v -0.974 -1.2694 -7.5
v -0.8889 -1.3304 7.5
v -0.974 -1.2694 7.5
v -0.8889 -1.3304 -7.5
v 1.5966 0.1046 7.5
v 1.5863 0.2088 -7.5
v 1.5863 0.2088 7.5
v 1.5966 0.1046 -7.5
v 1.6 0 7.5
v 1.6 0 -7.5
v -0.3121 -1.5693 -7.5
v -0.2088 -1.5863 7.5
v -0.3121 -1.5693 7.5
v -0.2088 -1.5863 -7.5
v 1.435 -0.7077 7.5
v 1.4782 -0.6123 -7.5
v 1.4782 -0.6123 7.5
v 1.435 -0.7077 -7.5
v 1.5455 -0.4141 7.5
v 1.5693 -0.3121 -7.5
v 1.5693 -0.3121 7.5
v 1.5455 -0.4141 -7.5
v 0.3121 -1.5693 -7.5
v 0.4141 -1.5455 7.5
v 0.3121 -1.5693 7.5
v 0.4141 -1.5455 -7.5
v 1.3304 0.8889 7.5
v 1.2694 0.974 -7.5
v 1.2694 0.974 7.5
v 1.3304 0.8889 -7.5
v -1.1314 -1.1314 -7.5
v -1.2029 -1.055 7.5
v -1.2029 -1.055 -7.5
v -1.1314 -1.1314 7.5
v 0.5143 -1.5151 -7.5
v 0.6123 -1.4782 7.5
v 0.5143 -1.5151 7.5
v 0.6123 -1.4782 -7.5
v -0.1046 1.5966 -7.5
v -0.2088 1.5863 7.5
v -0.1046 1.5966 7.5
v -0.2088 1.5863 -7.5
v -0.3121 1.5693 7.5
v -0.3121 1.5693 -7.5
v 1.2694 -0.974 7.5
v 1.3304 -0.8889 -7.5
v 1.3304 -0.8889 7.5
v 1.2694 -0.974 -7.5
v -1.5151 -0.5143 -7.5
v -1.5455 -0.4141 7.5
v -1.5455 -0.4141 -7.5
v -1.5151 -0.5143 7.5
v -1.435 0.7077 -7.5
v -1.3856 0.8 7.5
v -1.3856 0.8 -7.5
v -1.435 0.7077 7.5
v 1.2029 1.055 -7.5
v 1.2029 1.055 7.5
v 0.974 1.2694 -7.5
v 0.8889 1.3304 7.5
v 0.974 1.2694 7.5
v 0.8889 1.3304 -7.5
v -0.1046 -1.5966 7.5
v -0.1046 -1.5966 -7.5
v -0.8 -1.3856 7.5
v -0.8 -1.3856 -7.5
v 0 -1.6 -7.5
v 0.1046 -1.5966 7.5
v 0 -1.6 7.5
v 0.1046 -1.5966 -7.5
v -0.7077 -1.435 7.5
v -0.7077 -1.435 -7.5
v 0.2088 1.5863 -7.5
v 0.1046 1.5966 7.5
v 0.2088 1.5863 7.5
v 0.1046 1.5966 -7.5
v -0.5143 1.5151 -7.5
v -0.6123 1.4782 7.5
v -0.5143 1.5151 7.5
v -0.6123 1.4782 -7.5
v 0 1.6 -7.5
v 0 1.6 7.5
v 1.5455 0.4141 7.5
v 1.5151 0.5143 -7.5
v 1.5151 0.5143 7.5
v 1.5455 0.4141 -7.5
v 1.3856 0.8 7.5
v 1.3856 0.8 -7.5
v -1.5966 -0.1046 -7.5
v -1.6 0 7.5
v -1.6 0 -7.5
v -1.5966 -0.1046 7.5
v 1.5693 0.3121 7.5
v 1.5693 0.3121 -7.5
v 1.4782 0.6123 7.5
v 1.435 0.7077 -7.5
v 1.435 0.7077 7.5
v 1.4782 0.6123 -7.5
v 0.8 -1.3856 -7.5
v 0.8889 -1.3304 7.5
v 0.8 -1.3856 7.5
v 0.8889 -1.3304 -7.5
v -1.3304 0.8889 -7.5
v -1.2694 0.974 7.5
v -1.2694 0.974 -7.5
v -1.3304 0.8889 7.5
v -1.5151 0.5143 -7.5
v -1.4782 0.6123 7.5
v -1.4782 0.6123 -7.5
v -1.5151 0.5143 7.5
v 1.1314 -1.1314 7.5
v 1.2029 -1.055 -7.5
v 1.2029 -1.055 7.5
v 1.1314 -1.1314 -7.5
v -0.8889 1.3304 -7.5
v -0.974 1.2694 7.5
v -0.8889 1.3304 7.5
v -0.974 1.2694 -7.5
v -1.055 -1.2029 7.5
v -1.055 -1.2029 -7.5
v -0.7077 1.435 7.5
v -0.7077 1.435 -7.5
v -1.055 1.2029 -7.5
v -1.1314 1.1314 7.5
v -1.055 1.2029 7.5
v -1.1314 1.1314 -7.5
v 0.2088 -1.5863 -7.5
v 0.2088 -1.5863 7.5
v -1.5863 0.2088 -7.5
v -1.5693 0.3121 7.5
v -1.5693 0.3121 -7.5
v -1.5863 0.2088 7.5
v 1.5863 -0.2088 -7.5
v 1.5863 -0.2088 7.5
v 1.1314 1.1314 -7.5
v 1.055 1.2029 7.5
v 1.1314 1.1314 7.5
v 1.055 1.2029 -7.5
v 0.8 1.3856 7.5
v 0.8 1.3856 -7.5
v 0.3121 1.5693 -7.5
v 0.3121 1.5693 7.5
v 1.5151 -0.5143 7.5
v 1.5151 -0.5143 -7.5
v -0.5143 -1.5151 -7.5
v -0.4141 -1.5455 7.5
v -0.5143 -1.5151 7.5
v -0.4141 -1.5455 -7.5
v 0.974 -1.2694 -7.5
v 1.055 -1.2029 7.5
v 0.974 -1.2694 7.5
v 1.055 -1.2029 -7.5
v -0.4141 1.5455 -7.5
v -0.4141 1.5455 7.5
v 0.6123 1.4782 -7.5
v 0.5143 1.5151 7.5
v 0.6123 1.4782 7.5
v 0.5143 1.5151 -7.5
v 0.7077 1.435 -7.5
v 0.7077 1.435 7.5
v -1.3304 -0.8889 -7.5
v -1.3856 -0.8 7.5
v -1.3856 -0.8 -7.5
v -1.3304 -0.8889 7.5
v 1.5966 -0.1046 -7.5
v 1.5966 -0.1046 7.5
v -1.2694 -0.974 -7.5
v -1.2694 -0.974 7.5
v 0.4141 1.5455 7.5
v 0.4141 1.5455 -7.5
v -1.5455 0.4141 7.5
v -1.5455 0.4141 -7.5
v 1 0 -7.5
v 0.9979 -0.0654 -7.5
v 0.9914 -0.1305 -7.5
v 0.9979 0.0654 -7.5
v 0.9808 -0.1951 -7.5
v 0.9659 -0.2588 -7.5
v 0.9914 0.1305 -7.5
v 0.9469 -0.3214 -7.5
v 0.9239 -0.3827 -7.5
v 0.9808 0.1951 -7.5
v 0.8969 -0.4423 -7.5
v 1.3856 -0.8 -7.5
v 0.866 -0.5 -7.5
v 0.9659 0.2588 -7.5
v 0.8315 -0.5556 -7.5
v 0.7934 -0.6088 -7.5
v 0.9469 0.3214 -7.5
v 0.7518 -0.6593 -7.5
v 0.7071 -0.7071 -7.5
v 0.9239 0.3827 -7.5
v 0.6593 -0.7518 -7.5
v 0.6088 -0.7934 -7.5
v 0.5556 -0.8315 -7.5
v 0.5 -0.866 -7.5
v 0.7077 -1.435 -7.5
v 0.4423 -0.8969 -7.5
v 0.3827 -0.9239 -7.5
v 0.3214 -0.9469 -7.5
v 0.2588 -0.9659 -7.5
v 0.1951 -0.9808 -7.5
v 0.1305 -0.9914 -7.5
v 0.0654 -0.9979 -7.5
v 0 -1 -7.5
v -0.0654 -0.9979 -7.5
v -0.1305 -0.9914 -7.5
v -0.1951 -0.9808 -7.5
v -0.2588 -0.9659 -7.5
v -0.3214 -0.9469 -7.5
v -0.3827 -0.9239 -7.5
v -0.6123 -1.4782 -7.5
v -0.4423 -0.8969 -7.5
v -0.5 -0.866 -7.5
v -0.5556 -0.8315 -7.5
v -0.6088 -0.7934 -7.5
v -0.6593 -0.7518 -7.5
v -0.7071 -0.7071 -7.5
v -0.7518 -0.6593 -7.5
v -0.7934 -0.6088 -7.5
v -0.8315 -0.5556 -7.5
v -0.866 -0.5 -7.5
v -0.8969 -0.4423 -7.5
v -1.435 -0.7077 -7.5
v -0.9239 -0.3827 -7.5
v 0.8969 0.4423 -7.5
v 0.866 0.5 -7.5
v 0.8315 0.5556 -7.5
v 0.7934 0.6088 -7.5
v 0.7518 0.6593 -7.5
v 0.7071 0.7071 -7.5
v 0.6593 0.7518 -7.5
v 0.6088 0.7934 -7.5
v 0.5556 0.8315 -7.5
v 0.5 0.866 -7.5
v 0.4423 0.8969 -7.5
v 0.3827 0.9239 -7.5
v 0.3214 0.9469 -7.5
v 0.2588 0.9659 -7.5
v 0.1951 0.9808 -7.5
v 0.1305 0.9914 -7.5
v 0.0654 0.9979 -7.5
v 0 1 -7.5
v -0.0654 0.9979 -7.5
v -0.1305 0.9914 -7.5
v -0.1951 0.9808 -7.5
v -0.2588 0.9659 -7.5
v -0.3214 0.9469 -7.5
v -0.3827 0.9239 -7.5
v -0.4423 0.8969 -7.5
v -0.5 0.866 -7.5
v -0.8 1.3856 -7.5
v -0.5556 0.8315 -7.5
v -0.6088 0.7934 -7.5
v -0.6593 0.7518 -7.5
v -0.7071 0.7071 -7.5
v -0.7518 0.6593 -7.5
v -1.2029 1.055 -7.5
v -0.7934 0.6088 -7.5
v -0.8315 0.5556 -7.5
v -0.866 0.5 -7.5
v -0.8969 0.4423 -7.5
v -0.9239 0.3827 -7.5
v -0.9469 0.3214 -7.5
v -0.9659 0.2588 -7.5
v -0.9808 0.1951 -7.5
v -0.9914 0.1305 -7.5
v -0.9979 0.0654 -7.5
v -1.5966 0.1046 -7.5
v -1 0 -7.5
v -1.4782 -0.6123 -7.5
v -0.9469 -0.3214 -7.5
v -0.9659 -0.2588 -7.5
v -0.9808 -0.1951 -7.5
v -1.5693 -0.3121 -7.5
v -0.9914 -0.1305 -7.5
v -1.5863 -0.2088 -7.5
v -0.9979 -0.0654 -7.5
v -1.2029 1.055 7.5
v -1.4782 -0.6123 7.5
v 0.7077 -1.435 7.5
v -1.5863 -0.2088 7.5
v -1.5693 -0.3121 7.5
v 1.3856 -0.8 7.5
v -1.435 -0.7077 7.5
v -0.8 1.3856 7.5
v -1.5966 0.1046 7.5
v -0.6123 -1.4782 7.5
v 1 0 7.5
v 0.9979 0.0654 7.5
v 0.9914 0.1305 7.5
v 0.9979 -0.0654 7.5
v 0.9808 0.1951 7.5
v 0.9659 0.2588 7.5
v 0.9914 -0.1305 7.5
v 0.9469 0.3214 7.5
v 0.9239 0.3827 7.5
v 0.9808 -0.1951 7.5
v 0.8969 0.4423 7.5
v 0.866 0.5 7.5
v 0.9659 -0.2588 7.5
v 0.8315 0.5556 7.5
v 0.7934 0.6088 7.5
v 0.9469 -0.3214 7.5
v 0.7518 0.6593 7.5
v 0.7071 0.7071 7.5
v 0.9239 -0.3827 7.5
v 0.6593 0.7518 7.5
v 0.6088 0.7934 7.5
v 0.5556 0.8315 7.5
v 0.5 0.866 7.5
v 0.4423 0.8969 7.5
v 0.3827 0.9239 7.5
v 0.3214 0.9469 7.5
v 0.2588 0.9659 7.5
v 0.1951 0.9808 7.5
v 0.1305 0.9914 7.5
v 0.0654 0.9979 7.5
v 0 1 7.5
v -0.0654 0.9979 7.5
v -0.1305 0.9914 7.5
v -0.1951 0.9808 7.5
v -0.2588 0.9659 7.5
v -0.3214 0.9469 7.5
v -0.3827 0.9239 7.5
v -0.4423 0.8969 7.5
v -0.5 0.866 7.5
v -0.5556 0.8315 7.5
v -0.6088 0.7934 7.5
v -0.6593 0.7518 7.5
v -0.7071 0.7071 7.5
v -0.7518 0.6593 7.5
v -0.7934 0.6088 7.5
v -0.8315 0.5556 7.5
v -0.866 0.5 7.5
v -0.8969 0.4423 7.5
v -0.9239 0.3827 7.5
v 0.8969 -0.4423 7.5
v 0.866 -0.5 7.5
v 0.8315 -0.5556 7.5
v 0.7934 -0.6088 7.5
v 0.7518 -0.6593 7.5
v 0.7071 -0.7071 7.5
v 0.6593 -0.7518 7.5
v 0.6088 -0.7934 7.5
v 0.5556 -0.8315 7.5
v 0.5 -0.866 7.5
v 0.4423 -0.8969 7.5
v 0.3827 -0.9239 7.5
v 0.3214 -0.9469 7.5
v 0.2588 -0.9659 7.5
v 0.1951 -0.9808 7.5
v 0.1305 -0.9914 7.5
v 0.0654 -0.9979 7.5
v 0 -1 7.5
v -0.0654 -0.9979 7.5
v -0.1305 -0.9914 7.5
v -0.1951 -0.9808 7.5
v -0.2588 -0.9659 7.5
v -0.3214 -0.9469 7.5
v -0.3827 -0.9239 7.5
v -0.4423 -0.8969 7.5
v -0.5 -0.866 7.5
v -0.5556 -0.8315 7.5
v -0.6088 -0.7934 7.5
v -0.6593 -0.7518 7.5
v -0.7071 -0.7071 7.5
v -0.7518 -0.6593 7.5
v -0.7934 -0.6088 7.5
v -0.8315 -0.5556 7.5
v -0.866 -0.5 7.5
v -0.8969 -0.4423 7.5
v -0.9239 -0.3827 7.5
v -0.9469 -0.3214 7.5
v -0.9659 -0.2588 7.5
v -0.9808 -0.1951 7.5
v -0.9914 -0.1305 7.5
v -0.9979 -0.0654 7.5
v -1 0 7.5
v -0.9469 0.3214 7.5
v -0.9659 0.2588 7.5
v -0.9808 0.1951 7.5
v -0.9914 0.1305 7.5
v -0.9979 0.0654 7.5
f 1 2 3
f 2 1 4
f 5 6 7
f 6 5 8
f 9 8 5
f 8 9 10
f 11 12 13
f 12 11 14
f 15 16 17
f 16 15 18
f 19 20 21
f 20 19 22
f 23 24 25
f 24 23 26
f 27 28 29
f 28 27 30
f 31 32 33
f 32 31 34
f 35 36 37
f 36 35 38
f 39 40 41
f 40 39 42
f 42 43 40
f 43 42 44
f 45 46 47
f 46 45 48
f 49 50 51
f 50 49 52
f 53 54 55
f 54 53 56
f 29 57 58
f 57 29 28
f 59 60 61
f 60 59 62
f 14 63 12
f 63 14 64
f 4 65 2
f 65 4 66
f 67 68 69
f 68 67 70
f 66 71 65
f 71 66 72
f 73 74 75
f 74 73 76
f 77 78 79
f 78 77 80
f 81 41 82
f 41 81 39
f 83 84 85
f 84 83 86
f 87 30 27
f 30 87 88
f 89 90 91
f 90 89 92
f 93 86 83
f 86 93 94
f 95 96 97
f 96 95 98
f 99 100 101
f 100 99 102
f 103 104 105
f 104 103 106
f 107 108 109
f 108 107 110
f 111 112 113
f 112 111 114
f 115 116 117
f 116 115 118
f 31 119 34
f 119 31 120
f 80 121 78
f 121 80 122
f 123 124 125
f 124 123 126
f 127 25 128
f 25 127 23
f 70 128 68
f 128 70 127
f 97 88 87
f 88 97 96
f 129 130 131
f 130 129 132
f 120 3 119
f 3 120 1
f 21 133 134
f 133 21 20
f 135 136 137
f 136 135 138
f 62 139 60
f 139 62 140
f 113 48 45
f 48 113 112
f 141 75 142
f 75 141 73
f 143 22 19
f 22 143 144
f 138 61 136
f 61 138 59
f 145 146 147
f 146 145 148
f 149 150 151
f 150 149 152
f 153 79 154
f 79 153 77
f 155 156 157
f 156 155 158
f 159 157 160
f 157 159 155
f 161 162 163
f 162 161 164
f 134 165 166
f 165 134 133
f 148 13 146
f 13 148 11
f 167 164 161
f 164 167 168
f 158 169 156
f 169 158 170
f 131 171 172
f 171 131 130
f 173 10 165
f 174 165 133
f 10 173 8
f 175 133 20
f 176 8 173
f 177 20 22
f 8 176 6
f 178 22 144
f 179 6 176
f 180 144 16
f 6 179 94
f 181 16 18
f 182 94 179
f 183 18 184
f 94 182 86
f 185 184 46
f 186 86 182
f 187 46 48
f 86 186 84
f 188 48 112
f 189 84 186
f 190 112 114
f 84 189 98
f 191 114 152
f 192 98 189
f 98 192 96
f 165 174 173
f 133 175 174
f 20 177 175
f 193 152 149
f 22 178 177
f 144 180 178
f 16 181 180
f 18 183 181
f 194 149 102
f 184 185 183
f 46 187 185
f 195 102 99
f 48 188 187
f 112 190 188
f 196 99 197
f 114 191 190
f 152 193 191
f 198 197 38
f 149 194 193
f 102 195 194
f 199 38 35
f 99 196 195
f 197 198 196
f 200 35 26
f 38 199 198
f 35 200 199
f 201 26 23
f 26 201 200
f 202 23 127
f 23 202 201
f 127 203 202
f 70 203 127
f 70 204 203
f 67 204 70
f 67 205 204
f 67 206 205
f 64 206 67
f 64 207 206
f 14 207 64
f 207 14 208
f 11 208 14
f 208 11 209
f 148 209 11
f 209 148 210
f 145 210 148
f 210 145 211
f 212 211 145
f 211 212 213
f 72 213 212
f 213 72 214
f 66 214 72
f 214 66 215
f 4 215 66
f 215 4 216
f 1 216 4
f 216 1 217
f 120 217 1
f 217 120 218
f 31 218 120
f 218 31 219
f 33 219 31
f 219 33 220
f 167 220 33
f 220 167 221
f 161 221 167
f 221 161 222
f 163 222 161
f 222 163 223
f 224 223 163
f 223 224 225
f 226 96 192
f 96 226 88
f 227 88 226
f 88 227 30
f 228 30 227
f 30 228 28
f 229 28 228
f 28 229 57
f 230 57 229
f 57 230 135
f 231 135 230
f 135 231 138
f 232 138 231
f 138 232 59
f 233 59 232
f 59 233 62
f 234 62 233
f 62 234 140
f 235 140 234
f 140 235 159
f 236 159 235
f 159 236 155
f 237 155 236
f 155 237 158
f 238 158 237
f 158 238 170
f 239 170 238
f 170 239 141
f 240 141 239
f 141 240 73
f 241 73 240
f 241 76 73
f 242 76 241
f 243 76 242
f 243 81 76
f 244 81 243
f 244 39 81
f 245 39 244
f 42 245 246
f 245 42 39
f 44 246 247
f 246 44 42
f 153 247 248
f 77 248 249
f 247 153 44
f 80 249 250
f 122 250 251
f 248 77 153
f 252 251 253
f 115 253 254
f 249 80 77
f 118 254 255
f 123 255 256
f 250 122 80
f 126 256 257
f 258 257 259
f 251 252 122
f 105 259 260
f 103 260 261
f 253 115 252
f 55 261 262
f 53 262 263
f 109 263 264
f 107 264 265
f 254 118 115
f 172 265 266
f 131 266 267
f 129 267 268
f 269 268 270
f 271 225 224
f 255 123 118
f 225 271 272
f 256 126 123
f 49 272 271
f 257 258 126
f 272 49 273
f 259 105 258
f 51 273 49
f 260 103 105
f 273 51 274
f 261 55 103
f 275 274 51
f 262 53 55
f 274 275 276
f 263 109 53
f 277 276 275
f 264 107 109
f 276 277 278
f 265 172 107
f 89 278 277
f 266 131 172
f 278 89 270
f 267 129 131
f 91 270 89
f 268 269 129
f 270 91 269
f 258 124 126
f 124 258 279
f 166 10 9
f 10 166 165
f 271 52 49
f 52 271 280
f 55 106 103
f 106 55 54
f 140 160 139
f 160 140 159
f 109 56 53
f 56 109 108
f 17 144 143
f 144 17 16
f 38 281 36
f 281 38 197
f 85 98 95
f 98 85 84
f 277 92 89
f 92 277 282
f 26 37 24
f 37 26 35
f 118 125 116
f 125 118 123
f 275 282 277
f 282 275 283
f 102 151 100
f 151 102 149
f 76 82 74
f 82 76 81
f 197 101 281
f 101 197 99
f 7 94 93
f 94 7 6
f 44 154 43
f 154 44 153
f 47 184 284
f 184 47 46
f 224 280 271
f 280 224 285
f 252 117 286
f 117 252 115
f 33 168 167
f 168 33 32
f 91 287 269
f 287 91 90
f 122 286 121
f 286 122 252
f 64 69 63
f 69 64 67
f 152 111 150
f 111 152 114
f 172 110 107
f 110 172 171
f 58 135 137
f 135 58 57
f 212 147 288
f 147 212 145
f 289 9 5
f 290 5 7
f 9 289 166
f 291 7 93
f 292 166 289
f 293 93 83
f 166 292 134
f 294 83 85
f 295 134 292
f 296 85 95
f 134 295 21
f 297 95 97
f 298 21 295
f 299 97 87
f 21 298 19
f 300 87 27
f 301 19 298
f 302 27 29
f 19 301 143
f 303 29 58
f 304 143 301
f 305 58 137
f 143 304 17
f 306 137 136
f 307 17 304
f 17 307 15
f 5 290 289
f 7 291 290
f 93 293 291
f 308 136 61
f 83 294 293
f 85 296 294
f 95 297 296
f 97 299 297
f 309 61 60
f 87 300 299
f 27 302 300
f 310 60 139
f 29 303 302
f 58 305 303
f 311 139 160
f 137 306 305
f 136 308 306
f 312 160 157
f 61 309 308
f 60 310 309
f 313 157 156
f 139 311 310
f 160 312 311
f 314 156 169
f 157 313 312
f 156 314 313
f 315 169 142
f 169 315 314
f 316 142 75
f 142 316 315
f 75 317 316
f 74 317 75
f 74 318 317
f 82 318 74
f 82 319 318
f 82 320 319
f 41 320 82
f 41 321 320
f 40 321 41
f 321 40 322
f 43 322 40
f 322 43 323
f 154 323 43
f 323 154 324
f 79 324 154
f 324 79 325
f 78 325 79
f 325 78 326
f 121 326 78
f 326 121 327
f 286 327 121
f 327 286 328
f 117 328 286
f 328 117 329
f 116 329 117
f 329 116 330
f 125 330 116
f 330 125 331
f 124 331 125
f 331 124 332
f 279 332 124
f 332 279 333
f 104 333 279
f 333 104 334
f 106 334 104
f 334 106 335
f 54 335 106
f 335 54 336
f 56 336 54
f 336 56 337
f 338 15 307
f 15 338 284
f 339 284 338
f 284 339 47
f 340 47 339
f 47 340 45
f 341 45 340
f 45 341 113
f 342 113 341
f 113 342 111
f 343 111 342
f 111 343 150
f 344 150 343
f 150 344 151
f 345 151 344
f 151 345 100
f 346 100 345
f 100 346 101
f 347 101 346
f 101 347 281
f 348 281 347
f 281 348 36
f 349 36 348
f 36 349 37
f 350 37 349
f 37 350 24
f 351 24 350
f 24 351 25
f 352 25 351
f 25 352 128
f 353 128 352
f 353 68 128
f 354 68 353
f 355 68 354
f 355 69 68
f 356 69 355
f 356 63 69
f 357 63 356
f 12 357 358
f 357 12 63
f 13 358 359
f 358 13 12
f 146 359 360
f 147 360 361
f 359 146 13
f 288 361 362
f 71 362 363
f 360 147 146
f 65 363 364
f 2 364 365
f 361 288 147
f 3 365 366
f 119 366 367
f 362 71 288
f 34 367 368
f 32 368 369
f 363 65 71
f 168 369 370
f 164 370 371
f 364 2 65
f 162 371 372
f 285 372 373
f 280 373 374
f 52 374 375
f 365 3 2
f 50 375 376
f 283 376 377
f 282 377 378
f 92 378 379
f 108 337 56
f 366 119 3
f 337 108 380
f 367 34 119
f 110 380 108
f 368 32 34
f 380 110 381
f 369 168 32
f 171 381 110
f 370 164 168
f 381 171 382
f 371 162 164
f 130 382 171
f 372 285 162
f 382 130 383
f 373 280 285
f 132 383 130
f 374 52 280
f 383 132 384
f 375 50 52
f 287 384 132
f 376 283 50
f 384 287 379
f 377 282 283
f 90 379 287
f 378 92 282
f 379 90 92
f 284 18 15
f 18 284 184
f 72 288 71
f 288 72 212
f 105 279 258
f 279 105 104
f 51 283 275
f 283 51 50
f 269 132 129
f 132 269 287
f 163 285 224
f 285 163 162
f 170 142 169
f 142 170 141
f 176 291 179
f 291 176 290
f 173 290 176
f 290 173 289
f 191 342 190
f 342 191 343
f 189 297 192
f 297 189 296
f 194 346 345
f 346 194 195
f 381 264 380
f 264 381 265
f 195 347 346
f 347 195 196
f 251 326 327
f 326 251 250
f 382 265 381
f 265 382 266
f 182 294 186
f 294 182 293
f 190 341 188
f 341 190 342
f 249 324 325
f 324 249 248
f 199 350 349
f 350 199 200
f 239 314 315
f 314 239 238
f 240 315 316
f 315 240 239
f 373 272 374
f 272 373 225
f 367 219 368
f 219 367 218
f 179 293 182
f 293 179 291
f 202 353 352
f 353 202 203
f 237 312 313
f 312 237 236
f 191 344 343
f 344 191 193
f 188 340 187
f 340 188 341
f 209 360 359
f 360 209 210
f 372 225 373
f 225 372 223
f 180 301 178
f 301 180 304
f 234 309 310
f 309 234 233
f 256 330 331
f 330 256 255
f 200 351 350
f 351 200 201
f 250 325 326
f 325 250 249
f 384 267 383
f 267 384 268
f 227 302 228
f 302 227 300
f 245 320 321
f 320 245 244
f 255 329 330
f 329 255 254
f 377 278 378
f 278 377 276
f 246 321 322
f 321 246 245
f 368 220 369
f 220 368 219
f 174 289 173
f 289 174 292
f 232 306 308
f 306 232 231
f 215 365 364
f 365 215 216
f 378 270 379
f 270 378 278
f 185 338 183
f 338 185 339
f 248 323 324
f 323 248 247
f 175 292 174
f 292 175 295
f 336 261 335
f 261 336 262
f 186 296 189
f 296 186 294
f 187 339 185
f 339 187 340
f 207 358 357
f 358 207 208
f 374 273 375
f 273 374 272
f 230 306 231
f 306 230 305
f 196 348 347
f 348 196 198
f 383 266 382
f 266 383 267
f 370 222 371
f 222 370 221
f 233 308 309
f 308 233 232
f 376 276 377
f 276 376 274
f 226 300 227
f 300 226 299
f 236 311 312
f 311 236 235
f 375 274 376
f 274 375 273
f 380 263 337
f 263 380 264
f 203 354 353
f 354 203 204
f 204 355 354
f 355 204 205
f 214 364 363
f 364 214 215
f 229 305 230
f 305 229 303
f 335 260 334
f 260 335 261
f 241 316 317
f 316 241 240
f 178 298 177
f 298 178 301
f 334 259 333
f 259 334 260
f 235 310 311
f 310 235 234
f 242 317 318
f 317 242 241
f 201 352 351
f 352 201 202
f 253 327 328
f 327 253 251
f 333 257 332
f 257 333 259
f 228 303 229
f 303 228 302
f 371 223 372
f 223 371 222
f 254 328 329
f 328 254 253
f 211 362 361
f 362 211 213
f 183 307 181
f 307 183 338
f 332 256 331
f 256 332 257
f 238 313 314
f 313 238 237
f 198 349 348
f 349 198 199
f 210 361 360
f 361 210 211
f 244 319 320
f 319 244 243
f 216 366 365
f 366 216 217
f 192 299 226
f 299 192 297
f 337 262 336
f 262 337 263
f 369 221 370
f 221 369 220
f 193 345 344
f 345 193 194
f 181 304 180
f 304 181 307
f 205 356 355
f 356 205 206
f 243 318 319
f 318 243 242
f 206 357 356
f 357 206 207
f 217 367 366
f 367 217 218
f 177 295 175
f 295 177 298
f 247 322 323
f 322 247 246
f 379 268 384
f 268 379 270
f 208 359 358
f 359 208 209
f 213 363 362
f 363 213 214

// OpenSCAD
// PTFE heatshrink sleeving (simple hollow cylindrical tube)

// Parameters
length = 15;                 //[8:60:1]
center = 1;                  //[0:1:1]
forced_id = 0;               //[0:10:0.1]
type_id_default = 2;         //[0.5:6:0.1]
type_od_default = 3.2;       //[1:10:0.1]
wall_min = 0.3;              //[0.1:1.5:0.05]
overlap = 1;                 //[0.5:2:0.1]

$fn = 96;

// Derived dimensions
id = (forced_id > 0) ? forced_id : type_id_default;
od = max(type_od_default, id + 2*wall_min);

// Single connected solid: one hollow tube
module ptfe_heatshrink_sleeve() {
  color([0.85, 0.85, 0.8])
  difference() {
    cylinder(h=length, r=od/2, center=(center==1));
    cylinder(h=length + 2*overlap, r=id/2, center=(center==1));
  }
}

ptfe_heatshrink_sleeve();
